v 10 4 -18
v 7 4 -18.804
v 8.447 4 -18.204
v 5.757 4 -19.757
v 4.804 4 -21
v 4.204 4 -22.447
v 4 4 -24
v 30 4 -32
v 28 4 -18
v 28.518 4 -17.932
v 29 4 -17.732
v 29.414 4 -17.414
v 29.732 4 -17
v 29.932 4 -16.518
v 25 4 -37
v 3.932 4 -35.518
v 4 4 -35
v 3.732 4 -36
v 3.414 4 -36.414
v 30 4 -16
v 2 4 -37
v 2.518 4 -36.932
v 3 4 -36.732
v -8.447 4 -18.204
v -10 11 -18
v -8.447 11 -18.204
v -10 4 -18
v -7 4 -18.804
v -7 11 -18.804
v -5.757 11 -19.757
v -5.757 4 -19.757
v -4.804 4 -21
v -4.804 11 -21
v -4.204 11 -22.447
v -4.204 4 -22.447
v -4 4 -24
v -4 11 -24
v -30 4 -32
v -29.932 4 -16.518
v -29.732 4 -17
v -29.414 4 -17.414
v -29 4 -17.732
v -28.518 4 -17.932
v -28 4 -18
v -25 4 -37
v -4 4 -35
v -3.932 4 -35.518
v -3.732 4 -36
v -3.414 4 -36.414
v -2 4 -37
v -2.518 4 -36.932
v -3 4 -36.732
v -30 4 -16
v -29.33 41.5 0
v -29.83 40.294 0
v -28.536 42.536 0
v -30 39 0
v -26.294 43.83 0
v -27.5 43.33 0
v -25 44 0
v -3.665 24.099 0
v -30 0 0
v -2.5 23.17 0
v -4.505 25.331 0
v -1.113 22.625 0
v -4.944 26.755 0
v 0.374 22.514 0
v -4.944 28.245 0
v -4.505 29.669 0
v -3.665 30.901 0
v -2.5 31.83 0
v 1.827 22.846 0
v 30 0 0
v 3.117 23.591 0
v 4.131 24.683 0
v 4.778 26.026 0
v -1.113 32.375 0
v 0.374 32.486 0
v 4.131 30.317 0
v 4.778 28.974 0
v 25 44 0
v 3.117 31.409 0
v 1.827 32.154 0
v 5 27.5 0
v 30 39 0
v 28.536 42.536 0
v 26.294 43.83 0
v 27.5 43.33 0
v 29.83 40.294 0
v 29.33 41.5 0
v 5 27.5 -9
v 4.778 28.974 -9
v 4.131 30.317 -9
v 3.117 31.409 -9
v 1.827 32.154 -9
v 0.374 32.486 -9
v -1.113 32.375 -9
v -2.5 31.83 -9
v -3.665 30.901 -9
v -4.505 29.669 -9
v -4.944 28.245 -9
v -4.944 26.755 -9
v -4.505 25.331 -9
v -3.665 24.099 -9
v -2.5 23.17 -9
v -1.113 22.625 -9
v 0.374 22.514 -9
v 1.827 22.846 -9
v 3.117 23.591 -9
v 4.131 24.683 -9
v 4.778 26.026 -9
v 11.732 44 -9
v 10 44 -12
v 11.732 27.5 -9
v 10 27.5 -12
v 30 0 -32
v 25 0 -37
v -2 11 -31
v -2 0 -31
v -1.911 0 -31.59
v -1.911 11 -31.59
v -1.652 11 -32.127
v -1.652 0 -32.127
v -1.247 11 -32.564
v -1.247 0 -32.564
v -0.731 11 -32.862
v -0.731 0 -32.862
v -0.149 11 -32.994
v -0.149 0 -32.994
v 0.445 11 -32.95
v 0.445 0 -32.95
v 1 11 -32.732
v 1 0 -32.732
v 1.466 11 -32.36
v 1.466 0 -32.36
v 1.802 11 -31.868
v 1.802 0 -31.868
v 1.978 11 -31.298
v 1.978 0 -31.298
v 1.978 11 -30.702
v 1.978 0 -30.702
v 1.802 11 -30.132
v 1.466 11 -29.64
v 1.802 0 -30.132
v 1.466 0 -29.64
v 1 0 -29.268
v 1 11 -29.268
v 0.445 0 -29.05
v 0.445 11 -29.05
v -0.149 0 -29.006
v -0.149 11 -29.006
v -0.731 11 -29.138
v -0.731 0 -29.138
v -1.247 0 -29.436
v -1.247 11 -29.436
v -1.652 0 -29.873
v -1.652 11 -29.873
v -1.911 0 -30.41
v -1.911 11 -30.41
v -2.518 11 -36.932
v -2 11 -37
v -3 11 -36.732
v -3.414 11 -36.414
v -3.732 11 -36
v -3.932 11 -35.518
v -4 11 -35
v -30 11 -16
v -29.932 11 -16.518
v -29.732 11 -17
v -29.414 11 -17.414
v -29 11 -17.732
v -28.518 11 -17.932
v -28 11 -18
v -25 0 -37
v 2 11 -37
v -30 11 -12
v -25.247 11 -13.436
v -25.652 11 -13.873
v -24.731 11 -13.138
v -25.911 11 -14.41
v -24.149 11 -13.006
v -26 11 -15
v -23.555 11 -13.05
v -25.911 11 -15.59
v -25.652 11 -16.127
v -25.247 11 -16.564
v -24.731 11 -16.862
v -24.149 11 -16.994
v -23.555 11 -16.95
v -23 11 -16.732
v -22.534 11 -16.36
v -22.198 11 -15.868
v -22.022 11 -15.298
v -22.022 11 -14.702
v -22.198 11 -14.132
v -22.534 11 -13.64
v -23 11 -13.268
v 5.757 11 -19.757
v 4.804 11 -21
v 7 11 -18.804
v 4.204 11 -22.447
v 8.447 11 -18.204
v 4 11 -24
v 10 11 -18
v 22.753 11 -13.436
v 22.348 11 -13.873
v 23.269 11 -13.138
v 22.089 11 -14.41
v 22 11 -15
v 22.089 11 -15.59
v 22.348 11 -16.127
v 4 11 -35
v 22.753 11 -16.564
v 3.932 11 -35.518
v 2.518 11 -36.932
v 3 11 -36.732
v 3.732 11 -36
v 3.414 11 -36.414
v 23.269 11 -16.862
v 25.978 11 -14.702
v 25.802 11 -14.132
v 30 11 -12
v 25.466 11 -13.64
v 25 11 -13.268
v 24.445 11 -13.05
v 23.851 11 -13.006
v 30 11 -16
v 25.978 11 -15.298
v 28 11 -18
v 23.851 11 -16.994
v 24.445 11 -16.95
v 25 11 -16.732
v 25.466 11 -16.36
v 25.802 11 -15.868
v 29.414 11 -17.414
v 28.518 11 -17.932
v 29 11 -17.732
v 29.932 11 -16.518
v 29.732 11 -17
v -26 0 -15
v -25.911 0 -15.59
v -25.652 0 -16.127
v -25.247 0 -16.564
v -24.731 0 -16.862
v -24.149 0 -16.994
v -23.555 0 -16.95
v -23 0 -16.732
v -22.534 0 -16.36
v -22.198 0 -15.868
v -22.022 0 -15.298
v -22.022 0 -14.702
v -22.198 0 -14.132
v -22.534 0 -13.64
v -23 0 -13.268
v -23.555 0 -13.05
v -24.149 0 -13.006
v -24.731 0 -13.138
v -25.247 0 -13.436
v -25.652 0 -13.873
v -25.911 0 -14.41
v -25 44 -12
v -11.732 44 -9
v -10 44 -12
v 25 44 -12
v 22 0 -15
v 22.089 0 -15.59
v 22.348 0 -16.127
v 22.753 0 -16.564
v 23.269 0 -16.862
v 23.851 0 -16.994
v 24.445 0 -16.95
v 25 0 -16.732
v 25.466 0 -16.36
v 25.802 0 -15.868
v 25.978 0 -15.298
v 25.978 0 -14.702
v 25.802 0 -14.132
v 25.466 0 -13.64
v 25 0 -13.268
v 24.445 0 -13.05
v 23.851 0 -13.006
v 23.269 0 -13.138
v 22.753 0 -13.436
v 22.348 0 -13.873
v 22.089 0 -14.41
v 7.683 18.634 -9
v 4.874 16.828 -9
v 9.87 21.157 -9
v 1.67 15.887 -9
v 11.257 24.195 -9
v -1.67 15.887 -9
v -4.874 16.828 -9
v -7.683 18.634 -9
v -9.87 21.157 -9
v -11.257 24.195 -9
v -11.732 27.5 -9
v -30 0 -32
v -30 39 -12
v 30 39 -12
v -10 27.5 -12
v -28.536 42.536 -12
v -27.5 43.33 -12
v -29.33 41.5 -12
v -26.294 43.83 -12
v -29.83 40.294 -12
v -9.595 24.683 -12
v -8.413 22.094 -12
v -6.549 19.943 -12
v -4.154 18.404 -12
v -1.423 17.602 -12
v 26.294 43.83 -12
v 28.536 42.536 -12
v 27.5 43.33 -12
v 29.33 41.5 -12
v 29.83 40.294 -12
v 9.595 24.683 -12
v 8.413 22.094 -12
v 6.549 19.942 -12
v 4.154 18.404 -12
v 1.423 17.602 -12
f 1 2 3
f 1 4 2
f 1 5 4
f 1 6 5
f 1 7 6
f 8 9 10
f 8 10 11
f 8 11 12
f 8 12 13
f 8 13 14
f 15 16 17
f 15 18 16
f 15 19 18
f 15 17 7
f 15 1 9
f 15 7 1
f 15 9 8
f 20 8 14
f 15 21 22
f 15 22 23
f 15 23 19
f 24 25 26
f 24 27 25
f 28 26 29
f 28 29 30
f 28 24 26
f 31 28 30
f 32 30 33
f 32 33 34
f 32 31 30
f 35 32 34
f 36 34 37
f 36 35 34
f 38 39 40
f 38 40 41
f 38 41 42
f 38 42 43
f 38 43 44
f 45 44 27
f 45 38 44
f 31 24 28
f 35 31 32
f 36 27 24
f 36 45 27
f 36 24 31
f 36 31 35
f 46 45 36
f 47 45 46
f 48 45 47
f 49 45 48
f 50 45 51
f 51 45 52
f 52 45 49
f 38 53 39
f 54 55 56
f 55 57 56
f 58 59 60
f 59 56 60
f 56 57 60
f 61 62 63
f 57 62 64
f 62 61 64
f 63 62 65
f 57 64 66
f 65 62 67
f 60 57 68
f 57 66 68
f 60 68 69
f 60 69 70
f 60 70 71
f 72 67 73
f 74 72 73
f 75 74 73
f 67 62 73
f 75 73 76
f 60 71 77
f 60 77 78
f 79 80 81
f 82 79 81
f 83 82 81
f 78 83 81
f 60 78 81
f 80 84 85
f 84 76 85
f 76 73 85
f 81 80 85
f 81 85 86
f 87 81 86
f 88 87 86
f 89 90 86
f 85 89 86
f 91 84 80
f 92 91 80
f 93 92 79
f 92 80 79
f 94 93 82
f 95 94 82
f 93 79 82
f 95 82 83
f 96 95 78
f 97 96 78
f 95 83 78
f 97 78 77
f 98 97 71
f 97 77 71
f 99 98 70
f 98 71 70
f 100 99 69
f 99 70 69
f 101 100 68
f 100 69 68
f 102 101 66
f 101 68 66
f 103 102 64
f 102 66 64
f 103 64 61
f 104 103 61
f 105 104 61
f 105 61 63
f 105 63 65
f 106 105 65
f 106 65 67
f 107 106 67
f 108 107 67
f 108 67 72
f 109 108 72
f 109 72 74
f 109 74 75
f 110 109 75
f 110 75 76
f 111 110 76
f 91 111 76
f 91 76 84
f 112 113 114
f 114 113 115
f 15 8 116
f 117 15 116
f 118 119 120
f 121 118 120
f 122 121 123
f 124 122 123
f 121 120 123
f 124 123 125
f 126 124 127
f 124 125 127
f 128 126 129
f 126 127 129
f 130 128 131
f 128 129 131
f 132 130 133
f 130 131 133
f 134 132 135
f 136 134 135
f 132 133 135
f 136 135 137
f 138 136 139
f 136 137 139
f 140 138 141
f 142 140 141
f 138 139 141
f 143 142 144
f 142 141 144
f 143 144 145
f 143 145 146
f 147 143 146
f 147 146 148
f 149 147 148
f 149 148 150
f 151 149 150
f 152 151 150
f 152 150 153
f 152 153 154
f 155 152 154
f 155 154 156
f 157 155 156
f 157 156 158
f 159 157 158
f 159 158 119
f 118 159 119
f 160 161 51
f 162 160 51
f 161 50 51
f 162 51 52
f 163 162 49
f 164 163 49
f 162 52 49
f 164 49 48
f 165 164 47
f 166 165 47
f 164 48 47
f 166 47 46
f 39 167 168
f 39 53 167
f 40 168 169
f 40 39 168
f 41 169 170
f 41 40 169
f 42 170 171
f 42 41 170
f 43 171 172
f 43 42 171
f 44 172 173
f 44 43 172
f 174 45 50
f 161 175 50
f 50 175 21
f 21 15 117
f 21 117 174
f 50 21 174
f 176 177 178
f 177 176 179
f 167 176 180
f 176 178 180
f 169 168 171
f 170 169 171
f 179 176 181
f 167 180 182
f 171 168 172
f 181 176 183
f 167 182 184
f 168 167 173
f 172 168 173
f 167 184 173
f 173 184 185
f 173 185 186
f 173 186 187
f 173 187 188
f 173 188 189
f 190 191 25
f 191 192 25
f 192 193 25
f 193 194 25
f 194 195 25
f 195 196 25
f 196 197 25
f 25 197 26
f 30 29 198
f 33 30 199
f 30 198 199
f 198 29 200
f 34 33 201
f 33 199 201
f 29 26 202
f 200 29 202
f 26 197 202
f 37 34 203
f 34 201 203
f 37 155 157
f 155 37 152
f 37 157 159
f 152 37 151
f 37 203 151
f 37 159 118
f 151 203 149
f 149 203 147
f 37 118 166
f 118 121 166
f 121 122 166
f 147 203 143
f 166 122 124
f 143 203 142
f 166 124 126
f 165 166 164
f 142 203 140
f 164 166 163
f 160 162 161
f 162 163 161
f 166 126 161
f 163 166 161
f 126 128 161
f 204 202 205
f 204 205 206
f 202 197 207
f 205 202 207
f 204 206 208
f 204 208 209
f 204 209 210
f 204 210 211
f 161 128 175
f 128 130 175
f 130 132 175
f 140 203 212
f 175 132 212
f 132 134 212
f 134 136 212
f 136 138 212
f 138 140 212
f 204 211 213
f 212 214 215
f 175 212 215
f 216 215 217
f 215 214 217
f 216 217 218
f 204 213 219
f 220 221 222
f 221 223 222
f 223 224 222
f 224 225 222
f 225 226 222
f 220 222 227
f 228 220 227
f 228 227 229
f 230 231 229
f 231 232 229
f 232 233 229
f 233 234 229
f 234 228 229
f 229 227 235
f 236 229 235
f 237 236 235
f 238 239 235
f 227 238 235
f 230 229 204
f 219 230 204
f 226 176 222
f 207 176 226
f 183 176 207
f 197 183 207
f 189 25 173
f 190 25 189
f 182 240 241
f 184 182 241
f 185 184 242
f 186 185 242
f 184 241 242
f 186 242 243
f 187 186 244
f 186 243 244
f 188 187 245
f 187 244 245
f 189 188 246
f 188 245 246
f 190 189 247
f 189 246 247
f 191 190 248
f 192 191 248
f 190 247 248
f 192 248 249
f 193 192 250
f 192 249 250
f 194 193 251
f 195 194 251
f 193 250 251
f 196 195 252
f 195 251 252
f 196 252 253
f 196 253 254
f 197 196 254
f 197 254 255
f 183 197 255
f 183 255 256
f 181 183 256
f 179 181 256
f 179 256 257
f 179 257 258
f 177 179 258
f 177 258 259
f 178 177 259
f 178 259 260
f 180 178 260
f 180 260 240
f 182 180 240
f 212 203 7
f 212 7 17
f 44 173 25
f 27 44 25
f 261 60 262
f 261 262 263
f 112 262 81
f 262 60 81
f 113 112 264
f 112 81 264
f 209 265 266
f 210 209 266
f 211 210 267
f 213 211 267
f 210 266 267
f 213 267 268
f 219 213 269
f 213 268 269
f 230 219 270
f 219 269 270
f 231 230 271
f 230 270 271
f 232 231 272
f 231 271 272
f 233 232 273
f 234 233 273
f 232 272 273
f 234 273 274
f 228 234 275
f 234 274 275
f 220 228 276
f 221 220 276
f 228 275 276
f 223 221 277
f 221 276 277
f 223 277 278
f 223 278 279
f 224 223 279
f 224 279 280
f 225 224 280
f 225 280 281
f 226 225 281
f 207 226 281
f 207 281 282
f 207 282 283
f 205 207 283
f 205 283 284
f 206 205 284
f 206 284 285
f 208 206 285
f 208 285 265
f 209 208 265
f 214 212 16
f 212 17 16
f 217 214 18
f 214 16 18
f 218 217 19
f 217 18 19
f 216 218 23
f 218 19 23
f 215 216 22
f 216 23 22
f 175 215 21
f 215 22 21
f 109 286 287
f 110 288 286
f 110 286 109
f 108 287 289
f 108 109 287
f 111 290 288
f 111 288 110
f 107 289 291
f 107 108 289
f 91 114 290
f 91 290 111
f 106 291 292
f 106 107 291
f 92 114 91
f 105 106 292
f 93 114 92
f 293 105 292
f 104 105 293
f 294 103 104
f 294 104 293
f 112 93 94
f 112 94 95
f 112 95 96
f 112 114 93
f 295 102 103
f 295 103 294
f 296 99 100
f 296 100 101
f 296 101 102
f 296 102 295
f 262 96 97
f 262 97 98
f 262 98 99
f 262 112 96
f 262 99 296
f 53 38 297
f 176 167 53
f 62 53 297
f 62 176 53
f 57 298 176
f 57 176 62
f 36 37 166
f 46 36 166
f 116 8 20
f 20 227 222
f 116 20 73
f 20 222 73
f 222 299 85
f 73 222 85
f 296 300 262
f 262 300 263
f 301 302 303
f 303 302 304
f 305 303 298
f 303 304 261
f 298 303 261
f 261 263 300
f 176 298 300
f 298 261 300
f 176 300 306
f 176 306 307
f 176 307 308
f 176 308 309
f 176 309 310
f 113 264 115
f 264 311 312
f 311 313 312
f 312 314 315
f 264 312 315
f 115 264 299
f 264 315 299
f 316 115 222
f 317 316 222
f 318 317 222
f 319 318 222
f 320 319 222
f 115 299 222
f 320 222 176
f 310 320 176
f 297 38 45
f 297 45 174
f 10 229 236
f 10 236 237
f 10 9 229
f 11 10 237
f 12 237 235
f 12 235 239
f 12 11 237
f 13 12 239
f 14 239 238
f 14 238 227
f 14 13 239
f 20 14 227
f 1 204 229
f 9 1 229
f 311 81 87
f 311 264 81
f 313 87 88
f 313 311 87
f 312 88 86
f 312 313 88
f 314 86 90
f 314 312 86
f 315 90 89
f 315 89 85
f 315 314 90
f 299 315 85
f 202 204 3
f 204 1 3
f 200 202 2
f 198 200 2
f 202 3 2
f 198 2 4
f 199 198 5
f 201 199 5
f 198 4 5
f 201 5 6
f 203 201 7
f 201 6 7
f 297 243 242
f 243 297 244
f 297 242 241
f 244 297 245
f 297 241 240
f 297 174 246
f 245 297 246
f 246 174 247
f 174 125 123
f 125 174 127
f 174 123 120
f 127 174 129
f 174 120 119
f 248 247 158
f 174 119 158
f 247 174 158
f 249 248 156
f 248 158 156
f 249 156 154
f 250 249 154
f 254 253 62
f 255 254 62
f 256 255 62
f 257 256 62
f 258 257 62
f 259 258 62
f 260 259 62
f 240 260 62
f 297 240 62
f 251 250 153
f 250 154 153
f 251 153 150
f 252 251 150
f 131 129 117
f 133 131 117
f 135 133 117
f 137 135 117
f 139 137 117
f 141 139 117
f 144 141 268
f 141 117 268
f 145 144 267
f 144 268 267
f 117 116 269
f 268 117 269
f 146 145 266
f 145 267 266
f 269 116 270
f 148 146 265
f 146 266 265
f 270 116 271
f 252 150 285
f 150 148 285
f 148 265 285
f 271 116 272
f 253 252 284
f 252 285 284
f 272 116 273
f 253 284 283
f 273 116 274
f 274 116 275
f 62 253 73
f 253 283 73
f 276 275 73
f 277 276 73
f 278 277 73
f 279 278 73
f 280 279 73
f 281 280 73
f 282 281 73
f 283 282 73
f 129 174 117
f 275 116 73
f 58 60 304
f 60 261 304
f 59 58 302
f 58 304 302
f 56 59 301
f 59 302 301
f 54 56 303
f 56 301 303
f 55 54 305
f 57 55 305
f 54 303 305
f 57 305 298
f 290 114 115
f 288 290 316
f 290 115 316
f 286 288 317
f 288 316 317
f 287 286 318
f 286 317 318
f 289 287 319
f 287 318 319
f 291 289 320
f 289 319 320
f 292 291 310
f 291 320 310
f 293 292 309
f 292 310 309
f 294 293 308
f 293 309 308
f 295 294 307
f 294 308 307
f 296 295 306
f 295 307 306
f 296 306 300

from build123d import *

# Parameters (mm, degrees)
ESTRUSIONE_ESTRUSIONE1_DEPTH = 30
SCHIZZO6_W                   = 26
SCHIZZO6_H                   = 19
TAGLIO_ESTRUSIONE2_DEPTH     = 7
TAGLIO_ESTRUSIONE3_DEPTH     = 3
TAGLIO_ESTRUSIONE3_DRAFT     = 30
FORO_10_0_10_1_D             = 10
FORO_4_0_4_1_D               = 4
RACCORDO1_R                  = 5
RACCORDO2_R                  = 6
RACCORDO3_R                  = 2
SMUSSO1_SIZE                 = 5


with BuildPart() as part:
    # Schizzo2 → Estrusione-Estrusione1 (new, symmetric)
    with BuildSketch(Plane(origin=(0, 0, 0), x_dir=(0, 0, -1), z_dir=(1, 0, 0))):
        Polygon((0, 44), (12, 44), (12, 11), (37, 11), (37, 0), (0, 0), align=None)
    extrude(amount=ESTRUSIONE_ESTRUSIONE1_DEPTH, both=True)

    # Schizzo6 → Taglio-Estrusione2 (cut)
    with BuildSketch(Plane(origin=(0, 11, 0), x_dir=(1, 0, 0), z_dir=(0, 1, 0))):
        with Locations((-17, 27.5)):
            Rectangle(SCHIZZO6_W, SCHIZZO6_H)
        with Locations((17, 27.5)):
            Rectangle(SCHIZZO6_W, SCHIZZO6_H)
    extrude(amount=-TAGLIO_ESTRUSIONE2_DEPTH, mode=Mode.SUBTRACT)


with BuildPart() as taglio_estrusione3_tool:
    # Schizzo7 → Taglio-Estrusione3 (with draft: the straight prism first)
    with BuildSketch(Plane(origin=(0, 0, -12), x_dir=(-1, 0, 0), z_dir=(0, 0, -1))):
        with BuildLine():
            Line((9.999988724, 44), (-10.000011276, 44))
            Line((-10.000011276, 44), (-10, 27.499993166))
            ThreePointArc((-10, 27.499993166), (6.834e-06, 17.5), (10, 27.500006834))
            Line((10, 27.500006834), (9.999988724, 44))
        make_face()
    extrude(amount=-TAGLIO_ESTRUSIONE3_DEPTH)
    # Taglio-Estrusione3: the draft: its side faces are tilted about the plane it starts from
    taglio_estrusione3_sides = [taglio_estrusione3_tool.faces().sort_by_distance(p)[0] for p in [
        (-9.999994362, 35.750003417, -10.5),
        (1.1276e-05, 44, -10.5),
        (10.000005638, 35.749996583, -10.5),
        (-6.834e-06, 17.5, -10.5),
    ]]
    draft(taglio_estrusione3_sides, Plane(origin=(0, 0, -12), x_dir=(-1, 0, 0), z_dir=(0, 0, -1)), TAGLIO_ESTRUSIONE3_DRAFT)


with BuildPart() as part_1:
    add(part.part)

    # Taglio-Estrusione3: cut by taglio_estrusione3_tool
    add(taglio_estrusione3_tool.part, mode=Mode.SUBTRACT)

    # Foro Ø10.0 (10)-1 (through all)
    with Locations(Plane(origin=(0, 0, -9), x_dir=(-1, 0, 0), z_dir=(0, 0, -1))):
        with Locations((-7.048e-06, 27.5)):
            Hole(FORO_10_0_10_1_D / 2)

    # Foro Ø4.0 (4)-1 (through all)
    with Locations(Plane(origin=(0, 11, 0), x_dir=(1, 0, 0), z_dir=(0, 1, 0))):
        with Locations((0, 31), (-24, 15), (24, 15)):
            Hole(FORO_4_0_4_1_D / 2)

    # Raccordo1
    raccordo1_edges = [part_1.edges().sort_by_distance(p)[0] for p in [
        (30, 44, -6),
        (-30, 44, -6),
    ]]
    fillet(raccordo1_edges, radius=RACCORDO1_R)

    # Raccordo2
    raccordo2_edges = [part_1.edges().sort_by_distance(p)[0] for p in [
        (-4, 7.5, -18),
        (4, 7.5, -18),
    ]]
    fillet(raccordo2_edges, radius=RACCORDO2_R)

    # Raccordo3
    raccordo3_edges = [part_1.edges().sort_by_distance(p)[0] for p in [
        (-30, 7.5, -18),
        (-4, 7.5, -37),
        (4, 7.5, -37),
        (30, 7.5, -18),
    ]]
    fillet(raccordo3_edges, radius=RACCORDO3_R)

    # Smusso1
    smusso1_edges = [part_1.edges().sort_by_distance(p)[0] for p in [
        (30, 2, -37),
        (-30, 2, -37),
    ]]
    chamfer(smusso1_edges, length=SMUSSO1_SIZE)


solid = part_1.part
